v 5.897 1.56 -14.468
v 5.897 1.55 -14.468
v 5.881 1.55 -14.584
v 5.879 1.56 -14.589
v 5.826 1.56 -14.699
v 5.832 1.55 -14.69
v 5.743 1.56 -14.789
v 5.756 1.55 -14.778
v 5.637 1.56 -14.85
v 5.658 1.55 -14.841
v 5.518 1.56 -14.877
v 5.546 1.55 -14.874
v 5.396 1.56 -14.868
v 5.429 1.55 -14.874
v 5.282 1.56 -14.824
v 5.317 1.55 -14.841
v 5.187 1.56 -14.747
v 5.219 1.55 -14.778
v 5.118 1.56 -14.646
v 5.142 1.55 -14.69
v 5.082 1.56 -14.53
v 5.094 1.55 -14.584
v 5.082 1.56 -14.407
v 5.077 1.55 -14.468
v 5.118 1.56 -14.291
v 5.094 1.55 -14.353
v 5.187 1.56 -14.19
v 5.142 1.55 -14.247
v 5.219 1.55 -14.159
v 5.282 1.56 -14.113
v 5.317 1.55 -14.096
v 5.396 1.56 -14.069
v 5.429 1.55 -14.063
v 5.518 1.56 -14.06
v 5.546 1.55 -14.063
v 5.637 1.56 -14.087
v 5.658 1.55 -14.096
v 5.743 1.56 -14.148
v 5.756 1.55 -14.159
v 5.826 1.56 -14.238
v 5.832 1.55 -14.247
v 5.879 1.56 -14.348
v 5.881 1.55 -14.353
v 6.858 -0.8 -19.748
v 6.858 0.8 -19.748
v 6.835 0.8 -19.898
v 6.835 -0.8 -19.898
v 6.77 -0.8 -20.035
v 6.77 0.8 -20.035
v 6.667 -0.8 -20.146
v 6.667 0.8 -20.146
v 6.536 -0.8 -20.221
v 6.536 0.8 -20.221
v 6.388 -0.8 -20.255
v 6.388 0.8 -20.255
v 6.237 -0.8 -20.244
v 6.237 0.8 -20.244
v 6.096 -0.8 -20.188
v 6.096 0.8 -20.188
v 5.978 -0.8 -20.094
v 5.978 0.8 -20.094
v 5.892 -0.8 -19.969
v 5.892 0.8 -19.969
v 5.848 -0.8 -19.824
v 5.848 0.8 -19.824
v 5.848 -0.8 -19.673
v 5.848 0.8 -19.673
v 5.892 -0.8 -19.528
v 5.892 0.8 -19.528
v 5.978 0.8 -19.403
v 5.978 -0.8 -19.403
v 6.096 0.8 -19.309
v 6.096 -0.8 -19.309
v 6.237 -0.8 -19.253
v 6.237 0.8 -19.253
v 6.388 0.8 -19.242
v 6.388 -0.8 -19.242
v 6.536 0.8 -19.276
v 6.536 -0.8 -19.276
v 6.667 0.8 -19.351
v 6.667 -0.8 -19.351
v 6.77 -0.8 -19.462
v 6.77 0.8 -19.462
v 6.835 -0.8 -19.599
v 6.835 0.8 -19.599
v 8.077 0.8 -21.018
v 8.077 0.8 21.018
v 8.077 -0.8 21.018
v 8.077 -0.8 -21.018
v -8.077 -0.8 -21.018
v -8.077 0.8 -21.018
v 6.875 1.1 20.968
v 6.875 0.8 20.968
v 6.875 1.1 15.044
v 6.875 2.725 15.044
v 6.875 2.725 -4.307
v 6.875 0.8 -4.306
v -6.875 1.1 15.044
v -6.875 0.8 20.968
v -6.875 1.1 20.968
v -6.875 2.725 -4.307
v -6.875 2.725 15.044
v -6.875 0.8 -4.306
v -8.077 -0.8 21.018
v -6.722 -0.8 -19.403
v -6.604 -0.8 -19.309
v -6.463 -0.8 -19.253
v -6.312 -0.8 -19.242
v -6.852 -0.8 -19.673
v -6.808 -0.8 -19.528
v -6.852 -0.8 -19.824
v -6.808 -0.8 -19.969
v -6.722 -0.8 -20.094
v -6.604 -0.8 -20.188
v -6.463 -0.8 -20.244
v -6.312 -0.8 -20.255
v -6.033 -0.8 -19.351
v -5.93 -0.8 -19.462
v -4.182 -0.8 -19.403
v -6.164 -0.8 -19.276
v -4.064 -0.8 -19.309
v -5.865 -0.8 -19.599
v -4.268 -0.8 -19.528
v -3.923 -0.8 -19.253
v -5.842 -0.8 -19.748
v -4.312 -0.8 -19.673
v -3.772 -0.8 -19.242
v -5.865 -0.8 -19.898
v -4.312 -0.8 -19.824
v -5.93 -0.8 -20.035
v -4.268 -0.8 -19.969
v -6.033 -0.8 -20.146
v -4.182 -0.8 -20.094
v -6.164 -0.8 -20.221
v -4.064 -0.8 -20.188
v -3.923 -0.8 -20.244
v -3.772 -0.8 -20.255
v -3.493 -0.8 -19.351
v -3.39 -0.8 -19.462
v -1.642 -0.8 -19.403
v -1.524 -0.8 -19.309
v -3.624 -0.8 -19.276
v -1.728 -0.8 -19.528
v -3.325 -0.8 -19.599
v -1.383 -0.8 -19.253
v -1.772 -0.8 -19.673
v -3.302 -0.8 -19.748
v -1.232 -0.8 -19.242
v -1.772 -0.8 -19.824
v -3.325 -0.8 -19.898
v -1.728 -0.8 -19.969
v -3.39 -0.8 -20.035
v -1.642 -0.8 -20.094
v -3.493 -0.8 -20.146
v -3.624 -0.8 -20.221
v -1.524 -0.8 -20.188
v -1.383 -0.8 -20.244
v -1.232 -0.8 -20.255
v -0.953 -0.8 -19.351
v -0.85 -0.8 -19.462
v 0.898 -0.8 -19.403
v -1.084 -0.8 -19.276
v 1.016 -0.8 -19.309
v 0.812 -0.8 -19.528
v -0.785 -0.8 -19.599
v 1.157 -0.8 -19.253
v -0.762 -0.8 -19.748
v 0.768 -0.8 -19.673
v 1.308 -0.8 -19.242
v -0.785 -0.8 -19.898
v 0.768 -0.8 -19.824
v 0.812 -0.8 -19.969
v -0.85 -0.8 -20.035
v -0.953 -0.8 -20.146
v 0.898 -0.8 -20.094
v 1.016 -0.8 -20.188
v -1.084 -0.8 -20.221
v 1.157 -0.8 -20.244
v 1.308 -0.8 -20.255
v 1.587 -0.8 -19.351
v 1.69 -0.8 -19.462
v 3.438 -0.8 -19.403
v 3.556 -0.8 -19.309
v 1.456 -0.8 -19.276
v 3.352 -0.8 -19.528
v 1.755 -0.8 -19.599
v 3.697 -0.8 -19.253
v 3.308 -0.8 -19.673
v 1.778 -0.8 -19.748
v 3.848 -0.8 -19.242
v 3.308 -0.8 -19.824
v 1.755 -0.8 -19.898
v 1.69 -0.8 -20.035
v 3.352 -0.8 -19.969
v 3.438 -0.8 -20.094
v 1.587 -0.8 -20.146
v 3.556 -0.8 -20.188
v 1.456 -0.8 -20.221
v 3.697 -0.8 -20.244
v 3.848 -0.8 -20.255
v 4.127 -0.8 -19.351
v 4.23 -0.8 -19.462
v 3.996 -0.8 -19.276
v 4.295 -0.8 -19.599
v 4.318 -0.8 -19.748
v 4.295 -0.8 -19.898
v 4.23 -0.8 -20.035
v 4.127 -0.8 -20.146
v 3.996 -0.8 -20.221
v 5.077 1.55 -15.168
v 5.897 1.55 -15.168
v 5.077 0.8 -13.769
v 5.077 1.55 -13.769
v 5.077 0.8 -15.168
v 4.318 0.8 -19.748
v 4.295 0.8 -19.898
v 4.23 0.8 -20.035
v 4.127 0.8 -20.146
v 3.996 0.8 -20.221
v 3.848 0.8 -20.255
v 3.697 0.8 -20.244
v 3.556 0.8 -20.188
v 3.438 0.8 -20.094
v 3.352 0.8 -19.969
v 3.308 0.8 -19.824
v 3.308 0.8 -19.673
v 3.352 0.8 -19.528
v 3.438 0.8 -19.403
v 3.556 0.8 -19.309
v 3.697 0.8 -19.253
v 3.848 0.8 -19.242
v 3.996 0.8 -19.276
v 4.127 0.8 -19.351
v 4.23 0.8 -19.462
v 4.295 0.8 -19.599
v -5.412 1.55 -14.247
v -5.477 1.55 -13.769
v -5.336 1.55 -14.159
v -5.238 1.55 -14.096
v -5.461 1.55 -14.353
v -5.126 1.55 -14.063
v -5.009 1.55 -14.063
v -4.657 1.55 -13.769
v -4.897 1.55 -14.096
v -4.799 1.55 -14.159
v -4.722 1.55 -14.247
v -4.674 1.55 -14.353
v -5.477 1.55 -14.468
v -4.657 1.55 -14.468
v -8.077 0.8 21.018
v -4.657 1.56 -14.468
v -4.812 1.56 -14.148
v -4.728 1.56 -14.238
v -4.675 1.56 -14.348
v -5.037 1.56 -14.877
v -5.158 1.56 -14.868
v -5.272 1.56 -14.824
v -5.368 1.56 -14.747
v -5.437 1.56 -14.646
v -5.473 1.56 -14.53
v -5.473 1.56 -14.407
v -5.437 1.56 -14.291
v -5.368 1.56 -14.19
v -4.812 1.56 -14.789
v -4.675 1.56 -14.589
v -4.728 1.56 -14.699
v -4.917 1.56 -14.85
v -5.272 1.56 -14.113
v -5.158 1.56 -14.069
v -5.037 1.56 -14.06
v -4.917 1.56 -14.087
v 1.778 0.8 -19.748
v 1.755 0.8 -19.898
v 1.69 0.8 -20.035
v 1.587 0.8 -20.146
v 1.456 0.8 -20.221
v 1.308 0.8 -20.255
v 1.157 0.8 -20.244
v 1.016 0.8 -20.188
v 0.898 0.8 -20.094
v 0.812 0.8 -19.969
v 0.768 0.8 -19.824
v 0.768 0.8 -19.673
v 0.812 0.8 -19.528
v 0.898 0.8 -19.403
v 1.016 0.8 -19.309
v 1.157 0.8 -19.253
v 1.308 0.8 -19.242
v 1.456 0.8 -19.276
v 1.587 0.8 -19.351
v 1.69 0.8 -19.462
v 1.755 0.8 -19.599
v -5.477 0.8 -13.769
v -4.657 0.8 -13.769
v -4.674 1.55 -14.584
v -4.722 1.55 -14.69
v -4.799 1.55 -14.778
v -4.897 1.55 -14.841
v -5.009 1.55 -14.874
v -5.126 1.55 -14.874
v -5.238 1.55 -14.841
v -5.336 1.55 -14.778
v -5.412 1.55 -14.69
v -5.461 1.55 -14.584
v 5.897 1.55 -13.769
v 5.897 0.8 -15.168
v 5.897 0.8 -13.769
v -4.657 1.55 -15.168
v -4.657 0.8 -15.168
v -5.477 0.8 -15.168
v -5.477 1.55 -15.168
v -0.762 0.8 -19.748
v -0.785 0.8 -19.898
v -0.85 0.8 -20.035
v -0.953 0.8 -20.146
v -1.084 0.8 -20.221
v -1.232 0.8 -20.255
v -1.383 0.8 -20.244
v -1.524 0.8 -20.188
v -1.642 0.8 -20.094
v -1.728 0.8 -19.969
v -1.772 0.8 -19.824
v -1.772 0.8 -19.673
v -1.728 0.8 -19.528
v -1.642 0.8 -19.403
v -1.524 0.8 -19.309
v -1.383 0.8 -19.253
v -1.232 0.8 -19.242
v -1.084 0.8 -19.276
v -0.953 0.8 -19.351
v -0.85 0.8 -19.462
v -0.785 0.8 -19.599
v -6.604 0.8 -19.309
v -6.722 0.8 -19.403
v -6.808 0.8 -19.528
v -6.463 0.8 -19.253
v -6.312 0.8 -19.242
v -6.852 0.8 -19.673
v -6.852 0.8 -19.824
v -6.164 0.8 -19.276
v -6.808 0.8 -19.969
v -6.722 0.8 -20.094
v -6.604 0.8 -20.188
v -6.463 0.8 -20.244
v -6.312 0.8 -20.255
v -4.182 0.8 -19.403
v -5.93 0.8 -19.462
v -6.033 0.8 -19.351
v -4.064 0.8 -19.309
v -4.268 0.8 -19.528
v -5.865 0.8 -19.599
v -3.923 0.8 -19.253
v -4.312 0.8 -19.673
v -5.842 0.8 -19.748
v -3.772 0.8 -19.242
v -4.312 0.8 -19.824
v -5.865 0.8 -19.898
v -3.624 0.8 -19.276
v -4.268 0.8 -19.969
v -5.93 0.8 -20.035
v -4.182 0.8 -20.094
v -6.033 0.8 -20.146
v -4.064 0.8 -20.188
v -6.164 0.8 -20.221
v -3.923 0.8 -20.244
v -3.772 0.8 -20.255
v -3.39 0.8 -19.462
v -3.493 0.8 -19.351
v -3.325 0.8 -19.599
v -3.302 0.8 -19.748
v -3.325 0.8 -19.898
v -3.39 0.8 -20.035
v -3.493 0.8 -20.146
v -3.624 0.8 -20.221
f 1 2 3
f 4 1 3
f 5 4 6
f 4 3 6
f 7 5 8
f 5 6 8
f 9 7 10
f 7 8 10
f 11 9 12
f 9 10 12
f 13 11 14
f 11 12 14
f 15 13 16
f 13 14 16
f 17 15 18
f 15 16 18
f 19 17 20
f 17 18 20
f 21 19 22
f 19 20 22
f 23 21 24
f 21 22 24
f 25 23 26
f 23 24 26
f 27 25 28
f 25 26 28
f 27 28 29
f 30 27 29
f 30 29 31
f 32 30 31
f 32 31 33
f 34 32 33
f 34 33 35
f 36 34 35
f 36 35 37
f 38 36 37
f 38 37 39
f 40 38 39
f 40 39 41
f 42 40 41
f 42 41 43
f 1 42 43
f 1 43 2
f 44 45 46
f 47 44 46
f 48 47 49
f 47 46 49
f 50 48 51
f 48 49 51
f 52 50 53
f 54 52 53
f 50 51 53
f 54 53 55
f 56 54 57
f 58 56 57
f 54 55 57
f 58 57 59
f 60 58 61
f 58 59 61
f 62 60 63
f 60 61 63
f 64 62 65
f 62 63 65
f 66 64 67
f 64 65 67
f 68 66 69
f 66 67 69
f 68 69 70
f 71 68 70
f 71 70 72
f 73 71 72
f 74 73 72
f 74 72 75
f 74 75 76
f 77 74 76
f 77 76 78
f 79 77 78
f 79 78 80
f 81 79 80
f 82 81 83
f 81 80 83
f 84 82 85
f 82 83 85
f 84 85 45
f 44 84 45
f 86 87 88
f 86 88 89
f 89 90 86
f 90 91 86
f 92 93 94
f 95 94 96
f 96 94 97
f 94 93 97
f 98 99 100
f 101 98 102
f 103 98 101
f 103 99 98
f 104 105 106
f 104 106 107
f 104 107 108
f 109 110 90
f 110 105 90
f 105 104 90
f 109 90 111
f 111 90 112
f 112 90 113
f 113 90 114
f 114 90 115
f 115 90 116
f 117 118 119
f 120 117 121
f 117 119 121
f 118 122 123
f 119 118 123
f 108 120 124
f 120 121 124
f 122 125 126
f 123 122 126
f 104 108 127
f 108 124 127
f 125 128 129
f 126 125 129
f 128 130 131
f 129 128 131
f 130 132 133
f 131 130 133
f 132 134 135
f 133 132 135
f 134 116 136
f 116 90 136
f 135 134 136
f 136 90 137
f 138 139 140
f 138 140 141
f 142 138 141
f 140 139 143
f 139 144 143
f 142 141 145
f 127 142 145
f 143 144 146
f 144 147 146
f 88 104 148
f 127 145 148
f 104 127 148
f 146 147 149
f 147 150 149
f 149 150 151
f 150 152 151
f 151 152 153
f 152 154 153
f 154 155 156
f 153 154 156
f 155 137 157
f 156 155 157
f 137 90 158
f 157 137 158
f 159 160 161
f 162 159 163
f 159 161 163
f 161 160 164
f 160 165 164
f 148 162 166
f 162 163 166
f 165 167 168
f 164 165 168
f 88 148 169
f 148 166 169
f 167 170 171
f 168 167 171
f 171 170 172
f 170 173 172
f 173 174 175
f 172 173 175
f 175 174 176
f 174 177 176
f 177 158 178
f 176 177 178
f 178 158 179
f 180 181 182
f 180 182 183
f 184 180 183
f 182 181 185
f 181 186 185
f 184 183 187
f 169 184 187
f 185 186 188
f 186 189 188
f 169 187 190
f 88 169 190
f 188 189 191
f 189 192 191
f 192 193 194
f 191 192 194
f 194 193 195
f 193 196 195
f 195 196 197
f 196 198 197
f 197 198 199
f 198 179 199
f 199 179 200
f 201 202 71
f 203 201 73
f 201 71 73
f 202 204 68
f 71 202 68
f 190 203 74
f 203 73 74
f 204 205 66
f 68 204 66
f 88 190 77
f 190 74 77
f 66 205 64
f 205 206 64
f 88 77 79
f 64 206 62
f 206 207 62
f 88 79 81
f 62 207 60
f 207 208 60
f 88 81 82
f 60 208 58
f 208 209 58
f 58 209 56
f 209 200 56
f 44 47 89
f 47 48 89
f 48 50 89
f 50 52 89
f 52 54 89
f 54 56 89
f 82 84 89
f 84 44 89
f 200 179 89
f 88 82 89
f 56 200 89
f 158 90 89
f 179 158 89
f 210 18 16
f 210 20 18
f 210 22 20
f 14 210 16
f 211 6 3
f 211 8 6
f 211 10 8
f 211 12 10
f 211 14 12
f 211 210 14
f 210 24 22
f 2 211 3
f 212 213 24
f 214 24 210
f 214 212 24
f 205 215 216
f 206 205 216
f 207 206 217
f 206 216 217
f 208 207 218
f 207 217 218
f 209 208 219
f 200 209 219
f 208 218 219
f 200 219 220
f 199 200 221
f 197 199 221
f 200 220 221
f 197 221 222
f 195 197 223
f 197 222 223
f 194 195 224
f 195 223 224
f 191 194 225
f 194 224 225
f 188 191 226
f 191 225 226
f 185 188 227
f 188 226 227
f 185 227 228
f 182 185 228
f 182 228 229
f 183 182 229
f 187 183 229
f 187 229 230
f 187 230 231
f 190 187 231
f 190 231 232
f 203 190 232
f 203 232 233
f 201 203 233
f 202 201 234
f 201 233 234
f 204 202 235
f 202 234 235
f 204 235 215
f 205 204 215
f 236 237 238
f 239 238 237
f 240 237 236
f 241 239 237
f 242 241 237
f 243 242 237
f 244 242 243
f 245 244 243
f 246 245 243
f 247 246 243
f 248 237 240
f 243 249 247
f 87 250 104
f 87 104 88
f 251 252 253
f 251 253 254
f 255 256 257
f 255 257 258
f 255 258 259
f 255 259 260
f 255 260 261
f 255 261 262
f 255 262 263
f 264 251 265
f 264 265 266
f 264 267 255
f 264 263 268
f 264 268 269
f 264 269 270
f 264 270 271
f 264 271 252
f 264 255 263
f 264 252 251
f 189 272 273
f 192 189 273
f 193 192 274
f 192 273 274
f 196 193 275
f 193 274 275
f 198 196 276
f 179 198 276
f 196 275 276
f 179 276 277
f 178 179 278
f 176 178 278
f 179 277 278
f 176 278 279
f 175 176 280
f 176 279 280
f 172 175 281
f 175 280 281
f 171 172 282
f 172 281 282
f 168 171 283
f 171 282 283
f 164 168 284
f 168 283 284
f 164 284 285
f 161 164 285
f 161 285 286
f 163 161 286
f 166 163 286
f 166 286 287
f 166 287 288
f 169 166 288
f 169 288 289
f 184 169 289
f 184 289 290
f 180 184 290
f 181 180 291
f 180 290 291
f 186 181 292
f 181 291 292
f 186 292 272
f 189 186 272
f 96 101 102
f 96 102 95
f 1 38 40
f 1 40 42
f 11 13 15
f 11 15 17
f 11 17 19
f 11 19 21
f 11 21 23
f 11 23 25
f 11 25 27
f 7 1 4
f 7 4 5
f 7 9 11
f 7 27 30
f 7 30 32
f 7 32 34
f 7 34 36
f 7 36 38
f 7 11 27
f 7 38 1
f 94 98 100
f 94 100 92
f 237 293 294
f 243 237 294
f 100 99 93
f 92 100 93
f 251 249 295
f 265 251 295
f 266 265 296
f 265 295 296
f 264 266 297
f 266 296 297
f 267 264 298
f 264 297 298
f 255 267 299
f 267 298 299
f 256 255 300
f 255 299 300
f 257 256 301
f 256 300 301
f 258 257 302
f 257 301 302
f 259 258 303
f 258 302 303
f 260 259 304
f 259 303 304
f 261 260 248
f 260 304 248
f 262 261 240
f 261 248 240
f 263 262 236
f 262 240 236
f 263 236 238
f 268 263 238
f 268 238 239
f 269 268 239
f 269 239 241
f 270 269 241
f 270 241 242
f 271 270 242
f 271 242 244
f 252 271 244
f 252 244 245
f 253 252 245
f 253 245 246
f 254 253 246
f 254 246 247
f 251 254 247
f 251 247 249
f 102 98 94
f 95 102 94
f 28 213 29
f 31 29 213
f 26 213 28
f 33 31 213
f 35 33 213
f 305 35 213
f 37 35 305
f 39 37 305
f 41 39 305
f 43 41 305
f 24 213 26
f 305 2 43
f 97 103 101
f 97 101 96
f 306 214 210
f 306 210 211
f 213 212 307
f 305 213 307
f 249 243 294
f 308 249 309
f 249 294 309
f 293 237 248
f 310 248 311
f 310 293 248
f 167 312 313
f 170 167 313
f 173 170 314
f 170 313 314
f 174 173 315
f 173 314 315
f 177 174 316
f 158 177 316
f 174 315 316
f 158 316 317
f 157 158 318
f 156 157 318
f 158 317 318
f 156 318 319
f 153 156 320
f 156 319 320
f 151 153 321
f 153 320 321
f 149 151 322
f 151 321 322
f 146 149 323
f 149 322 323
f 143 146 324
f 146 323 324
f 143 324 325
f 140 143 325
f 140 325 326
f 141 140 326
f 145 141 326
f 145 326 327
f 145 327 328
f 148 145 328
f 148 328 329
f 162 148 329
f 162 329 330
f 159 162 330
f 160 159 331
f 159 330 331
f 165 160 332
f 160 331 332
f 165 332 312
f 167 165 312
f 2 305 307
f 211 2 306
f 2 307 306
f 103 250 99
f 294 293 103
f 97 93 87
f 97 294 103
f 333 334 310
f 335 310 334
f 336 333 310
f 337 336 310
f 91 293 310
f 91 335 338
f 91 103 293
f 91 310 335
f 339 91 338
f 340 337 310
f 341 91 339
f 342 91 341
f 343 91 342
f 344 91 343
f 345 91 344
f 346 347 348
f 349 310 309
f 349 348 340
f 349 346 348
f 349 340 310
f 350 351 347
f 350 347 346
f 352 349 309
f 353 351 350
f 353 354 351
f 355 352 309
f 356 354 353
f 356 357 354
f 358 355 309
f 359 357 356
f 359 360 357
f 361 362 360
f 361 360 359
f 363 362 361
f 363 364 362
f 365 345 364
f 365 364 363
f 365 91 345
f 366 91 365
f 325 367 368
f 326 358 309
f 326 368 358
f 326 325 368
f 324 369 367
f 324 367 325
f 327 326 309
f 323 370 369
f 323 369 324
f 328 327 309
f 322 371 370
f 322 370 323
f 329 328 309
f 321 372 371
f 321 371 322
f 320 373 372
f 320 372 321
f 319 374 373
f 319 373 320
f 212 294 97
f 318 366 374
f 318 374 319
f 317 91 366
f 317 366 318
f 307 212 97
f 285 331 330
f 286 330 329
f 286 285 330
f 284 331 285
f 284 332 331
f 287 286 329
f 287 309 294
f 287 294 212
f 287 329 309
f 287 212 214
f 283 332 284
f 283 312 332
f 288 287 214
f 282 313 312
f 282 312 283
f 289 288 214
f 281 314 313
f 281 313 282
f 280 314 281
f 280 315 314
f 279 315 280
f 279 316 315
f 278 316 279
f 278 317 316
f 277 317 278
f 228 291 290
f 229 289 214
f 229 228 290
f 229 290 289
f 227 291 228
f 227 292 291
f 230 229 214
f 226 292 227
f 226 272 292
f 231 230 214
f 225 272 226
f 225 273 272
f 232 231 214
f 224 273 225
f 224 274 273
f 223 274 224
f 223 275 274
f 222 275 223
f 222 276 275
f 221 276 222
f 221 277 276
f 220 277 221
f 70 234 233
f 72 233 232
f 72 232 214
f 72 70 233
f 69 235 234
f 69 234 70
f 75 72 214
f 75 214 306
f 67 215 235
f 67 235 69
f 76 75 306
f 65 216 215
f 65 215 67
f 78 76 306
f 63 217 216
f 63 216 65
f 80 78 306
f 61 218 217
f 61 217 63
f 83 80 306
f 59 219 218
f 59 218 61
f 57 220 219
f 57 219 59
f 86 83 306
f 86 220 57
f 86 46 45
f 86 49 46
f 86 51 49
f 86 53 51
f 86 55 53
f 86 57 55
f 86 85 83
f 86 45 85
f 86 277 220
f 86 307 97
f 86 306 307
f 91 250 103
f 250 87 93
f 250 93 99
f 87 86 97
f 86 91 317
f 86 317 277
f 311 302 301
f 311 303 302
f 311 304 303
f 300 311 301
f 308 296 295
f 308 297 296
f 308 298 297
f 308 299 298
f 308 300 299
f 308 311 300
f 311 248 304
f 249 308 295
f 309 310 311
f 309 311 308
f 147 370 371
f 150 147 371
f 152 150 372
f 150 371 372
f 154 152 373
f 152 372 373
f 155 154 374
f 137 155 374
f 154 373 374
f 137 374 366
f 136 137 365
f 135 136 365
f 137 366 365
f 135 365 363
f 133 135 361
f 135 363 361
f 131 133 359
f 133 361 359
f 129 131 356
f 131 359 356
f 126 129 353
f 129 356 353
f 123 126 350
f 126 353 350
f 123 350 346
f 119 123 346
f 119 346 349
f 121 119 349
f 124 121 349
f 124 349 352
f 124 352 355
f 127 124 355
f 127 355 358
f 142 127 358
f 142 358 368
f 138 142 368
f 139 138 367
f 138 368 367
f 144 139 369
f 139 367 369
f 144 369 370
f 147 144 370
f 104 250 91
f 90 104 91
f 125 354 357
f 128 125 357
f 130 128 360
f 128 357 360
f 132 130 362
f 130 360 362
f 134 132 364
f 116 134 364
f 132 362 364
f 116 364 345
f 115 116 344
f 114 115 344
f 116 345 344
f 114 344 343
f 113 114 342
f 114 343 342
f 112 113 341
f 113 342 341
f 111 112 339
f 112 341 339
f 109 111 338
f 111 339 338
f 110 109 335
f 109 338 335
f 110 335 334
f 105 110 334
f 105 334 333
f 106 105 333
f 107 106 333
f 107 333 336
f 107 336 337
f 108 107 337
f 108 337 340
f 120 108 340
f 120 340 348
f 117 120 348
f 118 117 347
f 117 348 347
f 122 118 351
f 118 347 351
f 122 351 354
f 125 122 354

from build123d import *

# Parameters (mm, degrees)
SKETCH1_W           = 16.1544
SKETCH1_H           = 42.037
BOSS_EXTRUDE1_DEPTH = 0.8001
SKETCH2_R           = 0.508
CUT_EXTRUDE1_DEPTH  = 1.6002
SKETCH3_W           = 13.75
SKETCH3_H           = 25.275
BOSS_EXTRUDE2_DEPTH = 0.3
SKETCH4_W           = 13.75
SKETCH4_H           = 19.35
BOSS_EXTRUDE3_DEPTH = 1.625
SKETCH5_W           = 0.82
SKETCH5_H           = 1.4
BOSS_EXTRUDE4_DEPTH = 0.75
SKETCH6_R           = 0.41
BOSS_EXTRUDE5_DEPTH = 0.01


with BuildPart() as part:
    # Sketch1 → Boss-Extrude1 (new body, symmetric)
    with BuildSketch(Plane(origin=(0, 0, 0), x_dir=(1, 0, 0), z_dir=(0, 1, 0))):
        Rectangle(SKETCH1_W, SKETCH1_H)
    extrude(amount=BOSS_EXTRUDE1_DEPTH, both=True)

    # Sketch2 → Cut-Extrude1 (cut)
    with BuildSketch(Plane(origin=(0, 0.8001, 0), x_dir=(1, 0, 0), z_dir=(0, 1, 0))):
        with Locations((-6.35, 19.7485)):
            Circle(SKETCH2_R)
        with Locations((-3.81, 19.7485)):
            Circle(SKETCH2_R)
        with Locations((-1.27, 19.7485)):
            Circle(SKETCH2_R)
        with Locations((1.27, 19.7485)):
            Circle(SKETCH2_R)
        with Locations((3.81, 19.7485)):
            Circle(SKETCH2_R)
        with Locations((6.35, 19.7485)):
            Circle(SKETCH2_R)
    extrude(amount=-CUT_EXTRUDE1_DEPTH, mode=Mode.SUBTRACT)

    # Sketch3 → Boss-Extrude2 (add)
    with BuildSketch(Plane(origin=(0, 0.8001, 0), x_dir=(1, 0, 0), z_dir=(0, 1, 0))):
        with Locations((0, -8.331)):
            Rectangle(SKETCH3_W, SKETCH3_H)
    extrude(amount=BOSS_EXTRUDE2_DEPTH)

    # Sketch4 → Boss-Extrude3 (add)
    with BuildSketch(Plane(origin=(0, 1.1001, 0), x_dir=(1, 0, 0), z_dir=(0, 1, 0))):
        with Locations((0, -5.3685)):
            Rectangle(SKETCH4_W, SKETCH4_H)
    extrude(amount=BOSS_EXTRUDE3_DEPTH)

    # Sketch5 → Boss-Extrude4 (add)
    with BuildSketch(Plane(origin=(0, 0.8001, 0), x_dir=(1, 0, 0), z_dir=(0, 1, 0))):
        with Locations((-5.0672, 14.4685)):
            Rectangle(SKETCH5_W, SKETCH5_H)
        with Locations((5.4872, 14.4685)):
            Rectangle(SKETCH5_W, SKETCH5_H)
    extrude(amount=BOSS_EXTRUDE4_DEPTH)

    # Sketch6 → Boss-Extrude5 (add)
    with BuildSketch(Plane(origin=(0, 1.5501, 0), x_dir=(1, 0, 0), z_dir=(0, 1, 0))):
        with Locations((-5.0672, 14.4685)):
            Circle(SKETCH6_R)
        with Locations((5.4872, 14.4685)):
            Circle(SKETCH6_R)
    extrude(amount=BOSS_EXTRUDE5_DEPTH)


solid = part.part
